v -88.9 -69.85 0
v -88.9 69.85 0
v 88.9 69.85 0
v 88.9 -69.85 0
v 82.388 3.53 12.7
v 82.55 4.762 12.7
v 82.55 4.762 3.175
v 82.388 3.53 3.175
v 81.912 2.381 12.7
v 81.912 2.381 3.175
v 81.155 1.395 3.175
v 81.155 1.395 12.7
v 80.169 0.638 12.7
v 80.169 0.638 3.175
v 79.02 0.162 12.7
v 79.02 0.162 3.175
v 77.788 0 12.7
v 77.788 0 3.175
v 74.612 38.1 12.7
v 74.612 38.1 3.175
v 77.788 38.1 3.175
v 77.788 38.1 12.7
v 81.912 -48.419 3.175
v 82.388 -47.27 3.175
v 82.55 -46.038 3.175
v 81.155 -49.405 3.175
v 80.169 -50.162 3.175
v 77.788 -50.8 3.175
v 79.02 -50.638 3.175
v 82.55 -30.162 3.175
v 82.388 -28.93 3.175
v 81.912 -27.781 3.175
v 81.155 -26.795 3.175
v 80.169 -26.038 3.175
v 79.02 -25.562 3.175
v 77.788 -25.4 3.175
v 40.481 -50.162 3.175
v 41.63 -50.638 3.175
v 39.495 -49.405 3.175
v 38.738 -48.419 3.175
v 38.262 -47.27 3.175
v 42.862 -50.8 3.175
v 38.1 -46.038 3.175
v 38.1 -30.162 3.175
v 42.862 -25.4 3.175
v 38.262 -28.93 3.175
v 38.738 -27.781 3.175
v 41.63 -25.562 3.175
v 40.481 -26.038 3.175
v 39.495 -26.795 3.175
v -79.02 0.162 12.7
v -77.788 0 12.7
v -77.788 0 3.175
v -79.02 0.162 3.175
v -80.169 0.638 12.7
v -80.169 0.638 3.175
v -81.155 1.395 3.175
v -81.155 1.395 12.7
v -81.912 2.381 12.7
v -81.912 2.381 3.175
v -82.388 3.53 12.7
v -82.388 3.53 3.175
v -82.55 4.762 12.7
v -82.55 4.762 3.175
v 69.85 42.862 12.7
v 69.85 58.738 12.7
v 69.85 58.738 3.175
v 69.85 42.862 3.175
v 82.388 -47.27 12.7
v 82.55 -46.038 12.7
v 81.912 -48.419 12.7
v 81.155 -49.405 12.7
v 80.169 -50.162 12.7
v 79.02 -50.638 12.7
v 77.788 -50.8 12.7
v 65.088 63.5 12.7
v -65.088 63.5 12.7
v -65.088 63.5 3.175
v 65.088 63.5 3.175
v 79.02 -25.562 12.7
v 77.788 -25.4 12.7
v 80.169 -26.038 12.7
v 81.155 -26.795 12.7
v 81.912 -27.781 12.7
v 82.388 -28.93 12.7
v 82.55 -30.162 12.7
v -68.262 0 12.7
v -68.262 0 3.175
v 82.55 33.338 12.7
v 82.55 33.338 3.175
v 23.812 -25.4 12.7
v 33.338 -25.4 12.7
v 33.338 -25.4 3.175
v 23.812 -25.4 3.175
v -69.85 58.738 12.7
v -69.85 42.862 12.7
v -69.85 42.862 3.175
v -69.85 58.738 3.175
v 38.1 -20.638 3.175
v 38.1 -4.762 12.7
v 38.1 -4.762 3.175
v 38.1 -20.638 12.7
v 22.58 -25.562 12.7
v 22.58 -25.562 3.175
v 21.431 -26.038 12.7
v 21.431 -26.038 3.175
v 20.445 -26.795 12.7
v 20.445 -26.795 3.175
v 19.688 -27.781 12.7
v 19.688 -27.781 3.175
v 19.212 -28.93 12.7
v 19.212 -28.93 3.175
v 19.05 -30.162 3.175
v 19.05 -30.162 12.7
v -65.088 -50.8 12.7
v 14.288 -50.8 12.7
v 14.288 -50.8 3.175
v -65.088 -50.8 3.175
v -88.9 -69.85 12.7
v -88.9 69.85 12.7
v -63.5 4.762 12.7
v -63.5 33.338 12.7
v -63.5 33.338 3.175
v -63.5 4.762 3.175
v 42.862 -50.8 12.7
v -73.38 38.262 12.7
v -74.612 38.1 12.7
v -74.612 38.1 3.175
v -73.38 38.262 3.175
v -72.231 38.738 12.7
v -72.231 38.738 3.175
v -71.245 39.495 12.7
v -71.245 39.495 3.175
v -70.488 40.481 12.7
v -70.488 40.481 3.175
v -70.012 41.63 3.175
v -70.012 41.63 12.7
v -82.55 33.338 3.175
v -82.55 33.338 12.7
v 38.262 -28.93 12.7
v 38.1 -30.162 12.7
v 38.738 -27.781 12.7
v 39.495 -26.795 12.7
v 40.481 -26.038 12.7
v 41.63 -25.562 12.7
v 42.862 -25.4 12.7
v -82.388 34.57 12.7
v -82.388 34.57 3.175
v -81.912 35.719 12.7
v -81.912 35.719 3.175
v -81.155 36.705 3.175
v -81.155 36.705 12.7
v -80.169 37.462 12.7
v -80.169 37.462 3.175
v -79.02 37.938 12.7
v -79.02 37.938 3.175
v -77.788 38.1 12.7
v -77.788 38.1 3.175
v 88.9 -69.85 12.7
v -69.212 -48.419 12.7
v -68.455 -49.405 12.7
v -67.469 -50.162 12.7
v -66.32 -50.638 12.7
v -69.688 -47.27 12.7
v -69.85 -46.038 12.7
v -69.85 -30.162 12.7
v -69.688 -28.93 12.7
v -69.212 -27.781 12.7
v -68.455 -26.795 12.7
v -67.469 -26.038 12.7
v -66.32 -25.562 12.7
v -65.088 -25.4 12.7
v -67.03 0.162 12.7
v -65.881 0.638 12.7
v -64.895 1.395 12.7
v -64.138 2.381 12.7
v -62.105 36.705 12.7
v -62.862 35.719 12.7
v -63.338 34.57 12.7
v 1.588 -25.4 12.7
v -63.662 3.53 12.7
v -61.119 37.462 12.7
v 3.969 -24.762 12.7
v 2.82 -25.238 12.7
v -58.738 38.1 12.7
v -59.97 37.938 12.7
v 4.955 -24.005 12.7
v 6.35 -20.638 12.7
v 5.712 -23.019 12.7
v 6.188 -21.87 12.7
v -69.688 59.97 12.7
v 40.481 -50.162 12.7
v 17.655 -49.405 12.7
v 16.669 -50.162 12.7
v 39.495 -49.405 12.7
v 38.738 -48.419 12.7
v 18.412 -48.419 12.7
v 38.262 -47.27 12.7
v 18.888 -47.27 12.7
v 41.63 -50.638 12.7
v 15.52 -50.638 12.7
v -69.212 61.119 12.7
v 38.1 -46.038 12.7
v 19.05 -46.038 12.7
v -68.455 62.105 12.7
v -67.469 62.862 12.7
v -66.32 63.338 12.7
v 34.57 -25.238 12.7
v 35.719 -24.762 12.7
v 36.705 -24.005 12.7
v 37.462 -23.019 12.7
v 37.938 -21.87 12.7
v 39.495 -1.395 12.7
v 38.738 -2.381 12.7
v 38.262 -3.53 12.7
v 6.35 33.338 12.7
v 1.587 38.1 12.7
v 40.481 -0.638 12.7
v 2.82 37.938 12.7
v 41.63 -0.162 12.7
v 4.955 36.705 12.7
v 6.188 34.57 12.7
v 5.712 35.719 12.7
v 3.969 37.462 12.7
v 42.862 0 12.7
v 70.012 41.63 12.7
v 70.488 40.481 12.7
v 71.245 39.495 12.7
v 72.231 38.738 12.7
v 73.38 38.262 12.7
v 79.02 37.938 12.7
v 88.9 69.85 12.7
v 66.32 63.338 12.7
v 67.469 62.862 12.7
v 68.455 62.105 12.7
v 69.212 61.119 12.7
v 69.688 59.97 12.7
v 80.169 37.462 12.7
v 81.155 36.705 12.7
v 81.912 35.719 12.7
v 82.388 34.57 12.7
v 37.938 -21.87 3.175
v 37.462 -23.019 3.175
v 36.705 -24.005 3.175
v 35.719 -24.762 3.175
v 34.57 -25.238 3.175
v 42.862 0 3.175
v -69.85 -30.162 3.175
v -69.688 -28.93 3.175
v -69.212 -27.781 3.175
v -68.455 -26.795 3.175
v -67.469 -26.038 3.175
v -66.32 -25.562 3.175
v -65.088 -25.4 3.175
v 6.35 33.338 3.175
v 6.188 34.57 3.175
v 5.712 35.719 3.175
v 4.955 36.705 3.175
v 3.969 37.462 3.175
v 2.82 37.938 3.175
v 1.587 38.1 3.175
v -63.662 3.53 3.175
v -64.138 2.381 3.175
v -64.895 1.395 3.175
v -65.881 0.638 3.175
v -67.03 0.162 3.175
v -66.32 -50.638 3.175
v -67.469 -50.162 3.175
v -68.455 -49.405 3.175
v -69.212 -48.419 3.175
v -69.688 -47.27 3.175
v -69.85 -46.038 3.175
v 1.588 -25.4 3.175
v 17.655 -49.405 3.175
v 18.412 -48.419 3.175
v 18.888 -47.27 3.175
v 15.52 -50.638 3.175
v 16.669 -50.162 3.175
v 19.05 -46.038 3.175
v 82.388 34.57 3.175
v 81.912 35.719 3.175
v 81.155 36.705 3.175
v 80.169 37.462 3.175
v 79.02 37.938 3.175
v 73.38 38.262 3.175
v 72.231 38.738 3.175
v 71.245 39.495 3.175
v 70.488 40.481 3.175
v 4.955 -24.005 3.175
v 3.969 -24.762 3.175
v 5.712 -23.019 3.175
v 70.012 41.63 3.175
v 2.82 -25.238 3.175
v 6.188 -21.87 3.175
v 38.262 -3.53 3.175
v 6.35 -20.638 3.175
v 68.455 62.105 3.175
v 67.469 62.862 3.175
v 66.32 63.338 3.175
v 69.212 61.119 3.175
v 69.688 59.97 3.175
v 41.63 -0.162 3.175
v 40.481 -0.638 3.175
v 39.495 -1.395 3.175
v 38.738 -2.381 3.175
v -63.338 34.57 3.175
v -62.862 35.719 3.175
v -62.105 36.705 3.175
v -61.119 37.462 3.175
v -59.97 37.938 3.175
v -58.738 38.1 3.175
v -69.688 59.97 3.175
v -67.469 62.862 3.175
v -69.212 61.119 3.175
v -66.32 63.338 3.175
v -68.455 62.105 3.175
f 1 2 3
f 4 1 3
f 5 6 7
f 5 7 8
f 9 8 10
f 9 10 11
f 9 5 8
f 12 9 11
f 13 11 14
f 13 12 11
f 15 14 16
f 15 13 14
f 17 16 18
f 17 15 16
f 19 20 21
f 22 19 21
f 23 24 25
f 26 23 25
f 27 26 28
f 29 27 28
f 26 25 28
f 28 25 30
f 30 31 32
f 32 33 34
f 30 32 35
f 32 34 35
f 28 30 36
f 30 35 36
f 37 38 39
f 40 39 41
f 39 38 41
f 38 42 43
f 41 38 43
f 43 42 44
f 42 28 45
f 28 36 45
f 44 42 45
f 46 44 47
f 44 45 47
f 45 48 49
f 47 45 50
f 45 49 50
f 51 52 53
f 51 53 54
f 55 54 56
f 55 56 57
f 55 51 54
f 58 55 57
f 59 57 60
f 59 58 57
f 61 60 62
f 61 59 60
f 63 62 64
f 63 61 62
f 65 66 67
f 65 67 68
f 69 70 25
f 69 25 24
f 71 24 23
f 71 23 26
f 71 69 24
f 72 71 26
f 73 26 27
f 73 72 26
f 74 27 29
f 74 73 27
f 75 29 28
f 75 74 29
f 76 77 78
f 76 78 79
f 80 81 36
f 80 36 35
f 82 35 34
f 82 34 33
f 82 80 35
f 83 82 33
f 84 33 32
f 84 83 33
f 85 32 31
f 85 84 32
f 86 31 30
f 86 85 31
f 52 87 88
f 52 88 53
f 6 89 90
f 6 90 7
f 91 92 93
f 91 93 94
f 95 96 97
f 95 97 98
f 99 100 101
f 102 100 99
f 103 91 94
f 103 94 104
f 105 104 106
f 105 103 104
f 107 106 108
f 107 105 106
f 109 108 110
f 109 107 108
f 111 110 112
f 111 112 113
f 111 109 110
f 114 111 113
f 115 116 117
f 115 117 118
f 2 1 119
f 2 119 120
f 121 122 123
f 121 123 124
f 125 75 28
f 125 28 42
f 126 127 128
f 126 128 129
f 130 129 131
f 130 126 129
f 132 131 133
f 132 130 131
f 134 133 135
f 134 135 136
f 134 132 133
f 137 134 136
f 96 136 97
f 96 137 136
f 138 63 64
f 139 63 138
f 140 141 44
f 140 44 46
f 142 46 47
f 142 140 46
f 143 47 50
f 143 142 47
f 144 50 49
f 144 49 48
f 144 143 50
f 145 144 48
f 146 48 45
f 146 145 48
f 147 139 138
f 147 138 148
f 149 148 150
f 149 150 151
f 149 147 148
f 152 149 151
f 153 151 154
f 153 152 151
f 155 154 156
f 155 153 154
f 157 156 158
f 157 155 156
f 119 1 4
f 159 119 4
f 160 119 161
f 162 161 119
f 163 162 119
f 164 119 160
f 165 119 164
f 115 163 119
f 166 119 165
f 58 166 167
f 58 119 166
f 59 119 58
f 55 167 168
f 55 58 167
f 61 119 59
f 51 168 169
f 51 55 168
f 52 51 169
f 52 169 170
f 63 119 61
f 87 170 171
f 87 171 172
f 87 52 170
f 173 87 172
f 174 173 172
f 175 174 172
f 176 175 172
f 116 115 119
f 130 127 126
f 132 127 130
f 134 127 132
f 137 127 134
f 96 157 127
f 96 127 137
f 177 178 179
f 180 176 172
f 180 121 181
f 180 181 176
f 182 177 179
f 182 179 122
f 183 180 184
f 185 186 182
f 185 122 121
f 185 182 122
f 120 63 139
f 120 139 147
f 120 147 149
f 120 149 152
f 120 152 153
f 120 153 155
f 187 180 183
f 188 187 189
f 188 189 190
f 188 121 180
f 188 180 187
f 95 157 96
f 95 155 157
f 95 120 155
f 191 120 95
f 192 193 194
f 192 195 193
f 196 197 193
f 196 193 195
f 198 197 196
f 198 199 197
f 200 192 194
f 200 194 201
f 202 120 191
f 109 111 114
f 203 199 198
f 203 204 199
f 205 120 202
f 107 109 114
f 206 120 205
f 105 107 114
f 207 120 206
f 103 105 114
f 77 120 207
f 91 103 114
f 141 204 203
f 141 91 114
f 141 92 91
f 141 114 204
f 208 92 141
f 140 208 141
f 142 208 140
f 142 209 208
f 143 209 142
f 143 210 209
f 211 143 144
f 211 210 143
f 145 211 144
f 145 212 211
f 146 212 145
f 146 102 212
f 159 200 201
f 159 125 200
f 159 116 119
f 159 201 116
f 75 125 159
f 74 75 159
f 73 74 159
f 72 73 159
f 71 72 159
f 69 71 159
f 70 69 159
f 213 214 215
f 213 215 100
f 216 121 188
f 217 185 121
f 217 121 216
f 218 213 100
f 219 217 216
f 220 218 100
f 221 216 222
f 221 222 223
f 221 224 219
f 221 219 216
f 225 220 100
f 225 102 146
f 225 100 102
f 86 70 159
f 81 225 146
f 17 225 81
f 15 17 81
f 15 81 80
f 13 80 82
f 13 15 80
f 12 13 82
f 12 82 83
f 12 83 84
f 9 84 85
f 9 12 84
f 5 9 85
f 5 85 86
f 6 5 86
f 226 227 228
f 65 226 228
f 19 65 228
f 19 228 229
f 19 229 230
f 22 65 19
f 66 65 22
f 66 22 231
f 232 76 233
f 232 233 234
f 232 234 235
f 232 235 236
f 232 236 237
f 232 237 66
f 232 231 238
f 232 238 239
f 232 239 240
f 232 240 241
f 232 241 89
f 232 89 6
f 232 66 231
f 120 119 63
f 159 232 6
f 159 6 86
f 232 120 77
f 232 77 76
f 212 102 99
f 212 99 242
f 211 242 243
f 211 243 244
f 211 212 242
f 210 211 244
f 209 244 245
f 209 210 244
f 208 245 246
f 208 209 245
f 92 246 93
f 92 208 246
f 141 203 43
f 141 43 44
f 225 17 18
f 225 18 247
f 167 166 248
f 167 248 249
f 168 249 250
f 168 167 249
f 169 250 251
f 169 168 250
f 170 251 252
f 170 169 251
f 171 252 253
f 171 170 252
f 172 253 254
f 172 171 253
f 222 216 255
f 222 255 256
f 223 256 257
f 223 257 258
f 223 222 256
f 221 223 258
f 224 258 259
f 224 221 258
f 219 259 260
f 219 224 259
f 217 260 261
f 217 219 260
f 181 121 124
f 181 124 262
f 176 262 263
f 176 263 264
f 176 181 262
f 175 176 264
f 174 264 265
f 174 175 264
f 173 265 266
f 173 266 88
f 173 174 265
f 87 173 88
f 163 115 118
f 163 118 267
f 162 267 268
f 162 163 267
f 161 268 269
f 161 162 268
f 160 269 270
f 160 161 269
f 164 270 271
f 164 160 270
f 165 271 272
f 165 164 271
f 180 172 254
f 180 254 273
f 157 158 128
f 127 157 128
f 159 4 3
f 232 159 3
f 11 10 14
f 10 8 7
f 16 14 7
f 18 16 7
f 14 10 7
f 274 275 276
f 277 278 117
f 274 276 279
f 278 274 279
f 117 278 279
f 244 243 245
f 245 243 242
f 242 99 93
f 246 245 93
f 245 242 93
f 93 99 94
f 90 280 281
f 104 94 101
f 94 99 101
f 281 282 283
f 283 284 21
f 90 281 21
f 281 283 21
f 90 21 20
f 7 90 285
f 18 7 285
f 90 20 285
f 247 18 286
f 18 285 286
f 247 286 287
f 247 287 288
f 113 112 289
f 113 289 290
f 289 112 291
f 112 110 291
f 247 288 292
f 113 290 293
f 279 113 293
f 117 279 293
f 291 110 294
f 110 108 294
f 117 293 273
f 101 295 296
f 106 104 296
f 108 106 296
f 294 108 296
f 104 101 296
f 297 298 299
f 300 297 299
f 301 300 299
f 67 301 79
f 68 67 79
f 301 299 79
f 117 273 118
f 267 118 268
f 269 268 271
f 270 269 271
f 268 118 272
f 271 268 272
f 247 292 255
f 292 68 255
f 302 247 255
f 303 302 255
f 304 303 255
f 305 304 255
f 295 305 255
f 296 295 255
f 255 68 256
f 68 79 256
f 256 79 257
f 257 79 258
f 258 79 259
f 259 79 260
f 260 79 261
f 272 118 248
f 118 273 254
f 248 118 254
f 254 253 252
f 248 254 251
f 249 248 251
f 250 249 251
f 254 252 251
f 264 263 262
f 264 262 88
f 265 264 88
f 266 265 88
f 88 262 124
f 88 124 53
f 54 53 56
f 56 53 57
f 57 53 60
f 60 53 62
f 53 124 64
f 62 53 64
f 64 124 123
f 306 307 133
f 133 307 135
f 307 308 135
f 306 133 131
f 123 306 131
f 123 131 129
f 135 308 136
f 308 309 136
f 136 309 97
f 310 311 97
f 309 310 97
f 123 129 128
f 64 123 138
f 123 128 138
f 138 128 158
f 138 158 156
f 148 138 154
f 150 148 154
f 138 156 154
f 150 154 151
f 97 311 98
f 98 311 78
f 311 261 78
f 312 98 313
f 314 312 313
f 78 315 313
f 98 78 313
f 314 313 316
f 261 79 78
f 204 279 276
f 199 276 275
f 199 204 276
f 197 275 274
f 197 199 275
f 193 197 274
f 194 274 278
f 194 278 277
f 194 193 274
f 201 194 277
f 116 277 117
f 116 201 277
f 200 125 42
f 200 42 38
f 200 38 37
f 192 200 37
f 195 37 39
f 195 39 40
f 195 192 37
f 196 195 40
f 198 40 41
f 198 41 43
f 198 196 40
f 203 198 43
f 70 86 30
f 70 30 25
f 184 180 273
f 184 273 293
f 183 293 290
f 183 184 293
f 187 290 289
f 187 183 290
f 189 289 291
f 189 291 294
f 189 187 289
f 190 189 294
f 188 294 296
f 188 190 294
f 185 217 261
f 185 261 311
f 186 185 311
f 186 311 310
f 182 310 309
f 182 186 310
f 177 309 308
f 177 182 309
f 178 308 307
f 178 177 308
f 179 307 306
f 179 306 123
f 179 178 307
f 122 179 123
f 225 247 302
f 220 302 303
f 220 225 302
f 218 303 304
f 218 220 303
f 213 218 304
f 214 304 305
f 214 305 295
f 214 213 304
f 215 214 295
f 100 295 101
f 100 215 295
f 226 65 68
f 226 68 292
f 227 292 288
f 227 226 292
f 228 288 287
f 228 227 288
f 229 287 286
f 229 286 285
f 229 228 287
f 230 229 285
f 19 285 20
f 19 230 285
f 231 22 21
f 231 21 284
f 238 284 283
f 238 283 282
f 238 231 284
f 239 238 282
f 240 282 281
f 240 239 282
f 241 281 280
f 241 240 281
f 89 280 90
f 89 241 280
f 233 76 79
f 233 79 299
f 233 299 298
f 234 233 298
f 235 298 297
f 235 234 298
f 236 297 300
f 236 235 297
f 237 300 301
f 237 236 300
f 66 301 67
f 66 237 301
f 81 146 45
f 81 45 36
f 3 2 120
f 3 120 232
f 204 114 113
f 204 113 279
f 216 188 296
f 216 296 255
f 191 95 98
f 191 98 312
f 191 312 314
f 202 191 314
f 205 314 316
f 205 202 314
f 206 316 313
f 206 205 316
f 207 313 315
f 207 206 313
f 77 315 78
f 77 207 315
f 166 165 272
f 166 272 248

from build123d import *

# Parameters (mm, degrees)
SKETCH1_W           = 177.8
SKETCH1_H           = 139.7
BOSS_EXTRUDE1_DEPTH = 12.7
CUT_EXTRUDE1_DEPTH  = 9.525


with BuildPart() as part:
    # Sketch1 → Boss-Extrude1 (new body)
    with BuildSketch(Plane.XY):
        Rectangle(SKETCH1_W, SKETCH1_H)
    extrude(amount=BOSS_EXTRUDE1_DEPTH)

    # Sketch2 → Cut-Extrude1 (cut)
    with BuildSketch(Plane.XY.offset(12.7)):
        with BuildLine():
            Line((-65.0875, 63.5), (65.0875, 63.5))
            ThreePointArc((65.0875, 63.5), (68.455096045, 62.105096045), (69.85, 58.7375))
            Line((69.85, 58.7375), (69.85, 42.8625))
            ThreePointArc((69.85, 42.8625), (71.244903955, 39.494903955), (74.6125, 38.1))
            Line((74.6125, 38.1), (77.7875, 38.1))
            ThreePointArc((77.7875, 38.1), (81.155096045, 36.705096045), (82.55, 33.3375))
            Line((82.55, 33.3375), (82.55, 4.7625))
            ThreePointArc((82.55, 4.7625), (81.155096045, 1.394903955), (77.7875, 0))
            Line((77.7875, 0), (42.8625, 0))
            ThreePointArc((42.8625, 0), (39.494903955, -1.394903955), (38.1, -4.7625))
            Line((38.1, -4.7625), (38.1, -20.6375))
            ThreePointArc((38.1, -20.6375), (36.705096045, -24.005096045), (33.3375, -25.4))
            Line((33.3375, -25.4), (23.8125, -25.4))
            ThreePointArc((23.8125, -25.4), (20.444903955, -26.794903955), (19.05, -30.1625))
            Line((19.05, -30.1625), (19.05, -46.0375))
            ThreePointArc((19.05, -46.0375), (17.655096045, -49.405096045), (14.2875, -50.8))
            Line((14.2875, -50.8), (-65.0875, -50.8))
            ThreePointArc((-65.0875, -50.8), (-68.455096045, -49.405096045), (-69.85, -46.0375))
            Line((-69.85, -46.0375), (-69.85, -30.1625))
            ThreePointArc((-69.85, -30.1625), (-68.455096045, -26.794903955), (-65.0875, -25.4))
            Line((-65.0875, -25.4), (1.5875, -25.4))
            ThreePointArc((1.5875, -25.4), (4.955096045, -24.005096045), (6.35, -20.6375))
            Line((6.35, -20.6375), (6.35, 0))
            Line((6.35, 0), (6.35, 33.3375))
            ThreePointArc((6.35, 33.3375), (4.955096045, 36.705096045), (1.5875, 38.1))
            Line((1.5875, 38.1), (-58.7375, 38.1))
            ThreePointArc((-58.7375, 38.1), (-62.105096045, 36.705096045), (-63.5, 33.3375))
            Line((-63.5, 33.3375), (-63.5, 4.7625))
            ThreePointArc((-63.5, 4.7625), (-64.894903955, 1.394903955), (-68.2625, 0))
            Line((-68.2625, 0), (-77.7875, 0))
            ThreePointArc((-77.7875, 0), (-81.155096045, 1.394903955), (-82.55, 4.7625))
            Line((-82.55, 4.7625), (-82.55, 33.3375))
            ThreePointArc((-82.55, 33.3375), (-81.155096045, 36.705096045), (-77.7875, 38.1))
            Line((-77.7875, 38.1), (-74.6125, 38.1))
            ThreePointArc((-74.6125, 38.1), (-71.244903955, 39.494903955), (-69.85, 42.8625))
            Line((-69.85, 42.8625), (-69.85, 58.7375))
            ThreePointArc((-69.85, 58.7375), (-68.455096045, 62.105096045), (-65.0875, 63.5))
        make_face()
        with BuildLine():
            Line((42.8625, -25.4), (77.7875, -25.4))
            ThreePointArc((77.7875, -25.4), (81.155096045, -26.794903955), (82.55, -30.1625))
            Line((82.55, -30.1625), (82.55, -46.0375))
            ThreePointArc((82.55, -46.0375), (81.155096045, -49.405096045), (77.7875, -50.8))
            Line((77.7875, -50.8), (42.8625, -50.8))
            ThreePointArc((42.8625, -50.8), (39.494903955, -49.405096045), (38.1, -46.0375))
            Line((38.1, -46.0375), (38.1, -30.1625))
            ThreePointArc((38.1, -30.1625), (39.494903955, -26.794903955), (42.8625, -25.4))
        make_face()
    extrude(amount=-CUT_EXTRUDE1_DEPTH, mode=Mode.SUBTRACT)


solid = part.part
